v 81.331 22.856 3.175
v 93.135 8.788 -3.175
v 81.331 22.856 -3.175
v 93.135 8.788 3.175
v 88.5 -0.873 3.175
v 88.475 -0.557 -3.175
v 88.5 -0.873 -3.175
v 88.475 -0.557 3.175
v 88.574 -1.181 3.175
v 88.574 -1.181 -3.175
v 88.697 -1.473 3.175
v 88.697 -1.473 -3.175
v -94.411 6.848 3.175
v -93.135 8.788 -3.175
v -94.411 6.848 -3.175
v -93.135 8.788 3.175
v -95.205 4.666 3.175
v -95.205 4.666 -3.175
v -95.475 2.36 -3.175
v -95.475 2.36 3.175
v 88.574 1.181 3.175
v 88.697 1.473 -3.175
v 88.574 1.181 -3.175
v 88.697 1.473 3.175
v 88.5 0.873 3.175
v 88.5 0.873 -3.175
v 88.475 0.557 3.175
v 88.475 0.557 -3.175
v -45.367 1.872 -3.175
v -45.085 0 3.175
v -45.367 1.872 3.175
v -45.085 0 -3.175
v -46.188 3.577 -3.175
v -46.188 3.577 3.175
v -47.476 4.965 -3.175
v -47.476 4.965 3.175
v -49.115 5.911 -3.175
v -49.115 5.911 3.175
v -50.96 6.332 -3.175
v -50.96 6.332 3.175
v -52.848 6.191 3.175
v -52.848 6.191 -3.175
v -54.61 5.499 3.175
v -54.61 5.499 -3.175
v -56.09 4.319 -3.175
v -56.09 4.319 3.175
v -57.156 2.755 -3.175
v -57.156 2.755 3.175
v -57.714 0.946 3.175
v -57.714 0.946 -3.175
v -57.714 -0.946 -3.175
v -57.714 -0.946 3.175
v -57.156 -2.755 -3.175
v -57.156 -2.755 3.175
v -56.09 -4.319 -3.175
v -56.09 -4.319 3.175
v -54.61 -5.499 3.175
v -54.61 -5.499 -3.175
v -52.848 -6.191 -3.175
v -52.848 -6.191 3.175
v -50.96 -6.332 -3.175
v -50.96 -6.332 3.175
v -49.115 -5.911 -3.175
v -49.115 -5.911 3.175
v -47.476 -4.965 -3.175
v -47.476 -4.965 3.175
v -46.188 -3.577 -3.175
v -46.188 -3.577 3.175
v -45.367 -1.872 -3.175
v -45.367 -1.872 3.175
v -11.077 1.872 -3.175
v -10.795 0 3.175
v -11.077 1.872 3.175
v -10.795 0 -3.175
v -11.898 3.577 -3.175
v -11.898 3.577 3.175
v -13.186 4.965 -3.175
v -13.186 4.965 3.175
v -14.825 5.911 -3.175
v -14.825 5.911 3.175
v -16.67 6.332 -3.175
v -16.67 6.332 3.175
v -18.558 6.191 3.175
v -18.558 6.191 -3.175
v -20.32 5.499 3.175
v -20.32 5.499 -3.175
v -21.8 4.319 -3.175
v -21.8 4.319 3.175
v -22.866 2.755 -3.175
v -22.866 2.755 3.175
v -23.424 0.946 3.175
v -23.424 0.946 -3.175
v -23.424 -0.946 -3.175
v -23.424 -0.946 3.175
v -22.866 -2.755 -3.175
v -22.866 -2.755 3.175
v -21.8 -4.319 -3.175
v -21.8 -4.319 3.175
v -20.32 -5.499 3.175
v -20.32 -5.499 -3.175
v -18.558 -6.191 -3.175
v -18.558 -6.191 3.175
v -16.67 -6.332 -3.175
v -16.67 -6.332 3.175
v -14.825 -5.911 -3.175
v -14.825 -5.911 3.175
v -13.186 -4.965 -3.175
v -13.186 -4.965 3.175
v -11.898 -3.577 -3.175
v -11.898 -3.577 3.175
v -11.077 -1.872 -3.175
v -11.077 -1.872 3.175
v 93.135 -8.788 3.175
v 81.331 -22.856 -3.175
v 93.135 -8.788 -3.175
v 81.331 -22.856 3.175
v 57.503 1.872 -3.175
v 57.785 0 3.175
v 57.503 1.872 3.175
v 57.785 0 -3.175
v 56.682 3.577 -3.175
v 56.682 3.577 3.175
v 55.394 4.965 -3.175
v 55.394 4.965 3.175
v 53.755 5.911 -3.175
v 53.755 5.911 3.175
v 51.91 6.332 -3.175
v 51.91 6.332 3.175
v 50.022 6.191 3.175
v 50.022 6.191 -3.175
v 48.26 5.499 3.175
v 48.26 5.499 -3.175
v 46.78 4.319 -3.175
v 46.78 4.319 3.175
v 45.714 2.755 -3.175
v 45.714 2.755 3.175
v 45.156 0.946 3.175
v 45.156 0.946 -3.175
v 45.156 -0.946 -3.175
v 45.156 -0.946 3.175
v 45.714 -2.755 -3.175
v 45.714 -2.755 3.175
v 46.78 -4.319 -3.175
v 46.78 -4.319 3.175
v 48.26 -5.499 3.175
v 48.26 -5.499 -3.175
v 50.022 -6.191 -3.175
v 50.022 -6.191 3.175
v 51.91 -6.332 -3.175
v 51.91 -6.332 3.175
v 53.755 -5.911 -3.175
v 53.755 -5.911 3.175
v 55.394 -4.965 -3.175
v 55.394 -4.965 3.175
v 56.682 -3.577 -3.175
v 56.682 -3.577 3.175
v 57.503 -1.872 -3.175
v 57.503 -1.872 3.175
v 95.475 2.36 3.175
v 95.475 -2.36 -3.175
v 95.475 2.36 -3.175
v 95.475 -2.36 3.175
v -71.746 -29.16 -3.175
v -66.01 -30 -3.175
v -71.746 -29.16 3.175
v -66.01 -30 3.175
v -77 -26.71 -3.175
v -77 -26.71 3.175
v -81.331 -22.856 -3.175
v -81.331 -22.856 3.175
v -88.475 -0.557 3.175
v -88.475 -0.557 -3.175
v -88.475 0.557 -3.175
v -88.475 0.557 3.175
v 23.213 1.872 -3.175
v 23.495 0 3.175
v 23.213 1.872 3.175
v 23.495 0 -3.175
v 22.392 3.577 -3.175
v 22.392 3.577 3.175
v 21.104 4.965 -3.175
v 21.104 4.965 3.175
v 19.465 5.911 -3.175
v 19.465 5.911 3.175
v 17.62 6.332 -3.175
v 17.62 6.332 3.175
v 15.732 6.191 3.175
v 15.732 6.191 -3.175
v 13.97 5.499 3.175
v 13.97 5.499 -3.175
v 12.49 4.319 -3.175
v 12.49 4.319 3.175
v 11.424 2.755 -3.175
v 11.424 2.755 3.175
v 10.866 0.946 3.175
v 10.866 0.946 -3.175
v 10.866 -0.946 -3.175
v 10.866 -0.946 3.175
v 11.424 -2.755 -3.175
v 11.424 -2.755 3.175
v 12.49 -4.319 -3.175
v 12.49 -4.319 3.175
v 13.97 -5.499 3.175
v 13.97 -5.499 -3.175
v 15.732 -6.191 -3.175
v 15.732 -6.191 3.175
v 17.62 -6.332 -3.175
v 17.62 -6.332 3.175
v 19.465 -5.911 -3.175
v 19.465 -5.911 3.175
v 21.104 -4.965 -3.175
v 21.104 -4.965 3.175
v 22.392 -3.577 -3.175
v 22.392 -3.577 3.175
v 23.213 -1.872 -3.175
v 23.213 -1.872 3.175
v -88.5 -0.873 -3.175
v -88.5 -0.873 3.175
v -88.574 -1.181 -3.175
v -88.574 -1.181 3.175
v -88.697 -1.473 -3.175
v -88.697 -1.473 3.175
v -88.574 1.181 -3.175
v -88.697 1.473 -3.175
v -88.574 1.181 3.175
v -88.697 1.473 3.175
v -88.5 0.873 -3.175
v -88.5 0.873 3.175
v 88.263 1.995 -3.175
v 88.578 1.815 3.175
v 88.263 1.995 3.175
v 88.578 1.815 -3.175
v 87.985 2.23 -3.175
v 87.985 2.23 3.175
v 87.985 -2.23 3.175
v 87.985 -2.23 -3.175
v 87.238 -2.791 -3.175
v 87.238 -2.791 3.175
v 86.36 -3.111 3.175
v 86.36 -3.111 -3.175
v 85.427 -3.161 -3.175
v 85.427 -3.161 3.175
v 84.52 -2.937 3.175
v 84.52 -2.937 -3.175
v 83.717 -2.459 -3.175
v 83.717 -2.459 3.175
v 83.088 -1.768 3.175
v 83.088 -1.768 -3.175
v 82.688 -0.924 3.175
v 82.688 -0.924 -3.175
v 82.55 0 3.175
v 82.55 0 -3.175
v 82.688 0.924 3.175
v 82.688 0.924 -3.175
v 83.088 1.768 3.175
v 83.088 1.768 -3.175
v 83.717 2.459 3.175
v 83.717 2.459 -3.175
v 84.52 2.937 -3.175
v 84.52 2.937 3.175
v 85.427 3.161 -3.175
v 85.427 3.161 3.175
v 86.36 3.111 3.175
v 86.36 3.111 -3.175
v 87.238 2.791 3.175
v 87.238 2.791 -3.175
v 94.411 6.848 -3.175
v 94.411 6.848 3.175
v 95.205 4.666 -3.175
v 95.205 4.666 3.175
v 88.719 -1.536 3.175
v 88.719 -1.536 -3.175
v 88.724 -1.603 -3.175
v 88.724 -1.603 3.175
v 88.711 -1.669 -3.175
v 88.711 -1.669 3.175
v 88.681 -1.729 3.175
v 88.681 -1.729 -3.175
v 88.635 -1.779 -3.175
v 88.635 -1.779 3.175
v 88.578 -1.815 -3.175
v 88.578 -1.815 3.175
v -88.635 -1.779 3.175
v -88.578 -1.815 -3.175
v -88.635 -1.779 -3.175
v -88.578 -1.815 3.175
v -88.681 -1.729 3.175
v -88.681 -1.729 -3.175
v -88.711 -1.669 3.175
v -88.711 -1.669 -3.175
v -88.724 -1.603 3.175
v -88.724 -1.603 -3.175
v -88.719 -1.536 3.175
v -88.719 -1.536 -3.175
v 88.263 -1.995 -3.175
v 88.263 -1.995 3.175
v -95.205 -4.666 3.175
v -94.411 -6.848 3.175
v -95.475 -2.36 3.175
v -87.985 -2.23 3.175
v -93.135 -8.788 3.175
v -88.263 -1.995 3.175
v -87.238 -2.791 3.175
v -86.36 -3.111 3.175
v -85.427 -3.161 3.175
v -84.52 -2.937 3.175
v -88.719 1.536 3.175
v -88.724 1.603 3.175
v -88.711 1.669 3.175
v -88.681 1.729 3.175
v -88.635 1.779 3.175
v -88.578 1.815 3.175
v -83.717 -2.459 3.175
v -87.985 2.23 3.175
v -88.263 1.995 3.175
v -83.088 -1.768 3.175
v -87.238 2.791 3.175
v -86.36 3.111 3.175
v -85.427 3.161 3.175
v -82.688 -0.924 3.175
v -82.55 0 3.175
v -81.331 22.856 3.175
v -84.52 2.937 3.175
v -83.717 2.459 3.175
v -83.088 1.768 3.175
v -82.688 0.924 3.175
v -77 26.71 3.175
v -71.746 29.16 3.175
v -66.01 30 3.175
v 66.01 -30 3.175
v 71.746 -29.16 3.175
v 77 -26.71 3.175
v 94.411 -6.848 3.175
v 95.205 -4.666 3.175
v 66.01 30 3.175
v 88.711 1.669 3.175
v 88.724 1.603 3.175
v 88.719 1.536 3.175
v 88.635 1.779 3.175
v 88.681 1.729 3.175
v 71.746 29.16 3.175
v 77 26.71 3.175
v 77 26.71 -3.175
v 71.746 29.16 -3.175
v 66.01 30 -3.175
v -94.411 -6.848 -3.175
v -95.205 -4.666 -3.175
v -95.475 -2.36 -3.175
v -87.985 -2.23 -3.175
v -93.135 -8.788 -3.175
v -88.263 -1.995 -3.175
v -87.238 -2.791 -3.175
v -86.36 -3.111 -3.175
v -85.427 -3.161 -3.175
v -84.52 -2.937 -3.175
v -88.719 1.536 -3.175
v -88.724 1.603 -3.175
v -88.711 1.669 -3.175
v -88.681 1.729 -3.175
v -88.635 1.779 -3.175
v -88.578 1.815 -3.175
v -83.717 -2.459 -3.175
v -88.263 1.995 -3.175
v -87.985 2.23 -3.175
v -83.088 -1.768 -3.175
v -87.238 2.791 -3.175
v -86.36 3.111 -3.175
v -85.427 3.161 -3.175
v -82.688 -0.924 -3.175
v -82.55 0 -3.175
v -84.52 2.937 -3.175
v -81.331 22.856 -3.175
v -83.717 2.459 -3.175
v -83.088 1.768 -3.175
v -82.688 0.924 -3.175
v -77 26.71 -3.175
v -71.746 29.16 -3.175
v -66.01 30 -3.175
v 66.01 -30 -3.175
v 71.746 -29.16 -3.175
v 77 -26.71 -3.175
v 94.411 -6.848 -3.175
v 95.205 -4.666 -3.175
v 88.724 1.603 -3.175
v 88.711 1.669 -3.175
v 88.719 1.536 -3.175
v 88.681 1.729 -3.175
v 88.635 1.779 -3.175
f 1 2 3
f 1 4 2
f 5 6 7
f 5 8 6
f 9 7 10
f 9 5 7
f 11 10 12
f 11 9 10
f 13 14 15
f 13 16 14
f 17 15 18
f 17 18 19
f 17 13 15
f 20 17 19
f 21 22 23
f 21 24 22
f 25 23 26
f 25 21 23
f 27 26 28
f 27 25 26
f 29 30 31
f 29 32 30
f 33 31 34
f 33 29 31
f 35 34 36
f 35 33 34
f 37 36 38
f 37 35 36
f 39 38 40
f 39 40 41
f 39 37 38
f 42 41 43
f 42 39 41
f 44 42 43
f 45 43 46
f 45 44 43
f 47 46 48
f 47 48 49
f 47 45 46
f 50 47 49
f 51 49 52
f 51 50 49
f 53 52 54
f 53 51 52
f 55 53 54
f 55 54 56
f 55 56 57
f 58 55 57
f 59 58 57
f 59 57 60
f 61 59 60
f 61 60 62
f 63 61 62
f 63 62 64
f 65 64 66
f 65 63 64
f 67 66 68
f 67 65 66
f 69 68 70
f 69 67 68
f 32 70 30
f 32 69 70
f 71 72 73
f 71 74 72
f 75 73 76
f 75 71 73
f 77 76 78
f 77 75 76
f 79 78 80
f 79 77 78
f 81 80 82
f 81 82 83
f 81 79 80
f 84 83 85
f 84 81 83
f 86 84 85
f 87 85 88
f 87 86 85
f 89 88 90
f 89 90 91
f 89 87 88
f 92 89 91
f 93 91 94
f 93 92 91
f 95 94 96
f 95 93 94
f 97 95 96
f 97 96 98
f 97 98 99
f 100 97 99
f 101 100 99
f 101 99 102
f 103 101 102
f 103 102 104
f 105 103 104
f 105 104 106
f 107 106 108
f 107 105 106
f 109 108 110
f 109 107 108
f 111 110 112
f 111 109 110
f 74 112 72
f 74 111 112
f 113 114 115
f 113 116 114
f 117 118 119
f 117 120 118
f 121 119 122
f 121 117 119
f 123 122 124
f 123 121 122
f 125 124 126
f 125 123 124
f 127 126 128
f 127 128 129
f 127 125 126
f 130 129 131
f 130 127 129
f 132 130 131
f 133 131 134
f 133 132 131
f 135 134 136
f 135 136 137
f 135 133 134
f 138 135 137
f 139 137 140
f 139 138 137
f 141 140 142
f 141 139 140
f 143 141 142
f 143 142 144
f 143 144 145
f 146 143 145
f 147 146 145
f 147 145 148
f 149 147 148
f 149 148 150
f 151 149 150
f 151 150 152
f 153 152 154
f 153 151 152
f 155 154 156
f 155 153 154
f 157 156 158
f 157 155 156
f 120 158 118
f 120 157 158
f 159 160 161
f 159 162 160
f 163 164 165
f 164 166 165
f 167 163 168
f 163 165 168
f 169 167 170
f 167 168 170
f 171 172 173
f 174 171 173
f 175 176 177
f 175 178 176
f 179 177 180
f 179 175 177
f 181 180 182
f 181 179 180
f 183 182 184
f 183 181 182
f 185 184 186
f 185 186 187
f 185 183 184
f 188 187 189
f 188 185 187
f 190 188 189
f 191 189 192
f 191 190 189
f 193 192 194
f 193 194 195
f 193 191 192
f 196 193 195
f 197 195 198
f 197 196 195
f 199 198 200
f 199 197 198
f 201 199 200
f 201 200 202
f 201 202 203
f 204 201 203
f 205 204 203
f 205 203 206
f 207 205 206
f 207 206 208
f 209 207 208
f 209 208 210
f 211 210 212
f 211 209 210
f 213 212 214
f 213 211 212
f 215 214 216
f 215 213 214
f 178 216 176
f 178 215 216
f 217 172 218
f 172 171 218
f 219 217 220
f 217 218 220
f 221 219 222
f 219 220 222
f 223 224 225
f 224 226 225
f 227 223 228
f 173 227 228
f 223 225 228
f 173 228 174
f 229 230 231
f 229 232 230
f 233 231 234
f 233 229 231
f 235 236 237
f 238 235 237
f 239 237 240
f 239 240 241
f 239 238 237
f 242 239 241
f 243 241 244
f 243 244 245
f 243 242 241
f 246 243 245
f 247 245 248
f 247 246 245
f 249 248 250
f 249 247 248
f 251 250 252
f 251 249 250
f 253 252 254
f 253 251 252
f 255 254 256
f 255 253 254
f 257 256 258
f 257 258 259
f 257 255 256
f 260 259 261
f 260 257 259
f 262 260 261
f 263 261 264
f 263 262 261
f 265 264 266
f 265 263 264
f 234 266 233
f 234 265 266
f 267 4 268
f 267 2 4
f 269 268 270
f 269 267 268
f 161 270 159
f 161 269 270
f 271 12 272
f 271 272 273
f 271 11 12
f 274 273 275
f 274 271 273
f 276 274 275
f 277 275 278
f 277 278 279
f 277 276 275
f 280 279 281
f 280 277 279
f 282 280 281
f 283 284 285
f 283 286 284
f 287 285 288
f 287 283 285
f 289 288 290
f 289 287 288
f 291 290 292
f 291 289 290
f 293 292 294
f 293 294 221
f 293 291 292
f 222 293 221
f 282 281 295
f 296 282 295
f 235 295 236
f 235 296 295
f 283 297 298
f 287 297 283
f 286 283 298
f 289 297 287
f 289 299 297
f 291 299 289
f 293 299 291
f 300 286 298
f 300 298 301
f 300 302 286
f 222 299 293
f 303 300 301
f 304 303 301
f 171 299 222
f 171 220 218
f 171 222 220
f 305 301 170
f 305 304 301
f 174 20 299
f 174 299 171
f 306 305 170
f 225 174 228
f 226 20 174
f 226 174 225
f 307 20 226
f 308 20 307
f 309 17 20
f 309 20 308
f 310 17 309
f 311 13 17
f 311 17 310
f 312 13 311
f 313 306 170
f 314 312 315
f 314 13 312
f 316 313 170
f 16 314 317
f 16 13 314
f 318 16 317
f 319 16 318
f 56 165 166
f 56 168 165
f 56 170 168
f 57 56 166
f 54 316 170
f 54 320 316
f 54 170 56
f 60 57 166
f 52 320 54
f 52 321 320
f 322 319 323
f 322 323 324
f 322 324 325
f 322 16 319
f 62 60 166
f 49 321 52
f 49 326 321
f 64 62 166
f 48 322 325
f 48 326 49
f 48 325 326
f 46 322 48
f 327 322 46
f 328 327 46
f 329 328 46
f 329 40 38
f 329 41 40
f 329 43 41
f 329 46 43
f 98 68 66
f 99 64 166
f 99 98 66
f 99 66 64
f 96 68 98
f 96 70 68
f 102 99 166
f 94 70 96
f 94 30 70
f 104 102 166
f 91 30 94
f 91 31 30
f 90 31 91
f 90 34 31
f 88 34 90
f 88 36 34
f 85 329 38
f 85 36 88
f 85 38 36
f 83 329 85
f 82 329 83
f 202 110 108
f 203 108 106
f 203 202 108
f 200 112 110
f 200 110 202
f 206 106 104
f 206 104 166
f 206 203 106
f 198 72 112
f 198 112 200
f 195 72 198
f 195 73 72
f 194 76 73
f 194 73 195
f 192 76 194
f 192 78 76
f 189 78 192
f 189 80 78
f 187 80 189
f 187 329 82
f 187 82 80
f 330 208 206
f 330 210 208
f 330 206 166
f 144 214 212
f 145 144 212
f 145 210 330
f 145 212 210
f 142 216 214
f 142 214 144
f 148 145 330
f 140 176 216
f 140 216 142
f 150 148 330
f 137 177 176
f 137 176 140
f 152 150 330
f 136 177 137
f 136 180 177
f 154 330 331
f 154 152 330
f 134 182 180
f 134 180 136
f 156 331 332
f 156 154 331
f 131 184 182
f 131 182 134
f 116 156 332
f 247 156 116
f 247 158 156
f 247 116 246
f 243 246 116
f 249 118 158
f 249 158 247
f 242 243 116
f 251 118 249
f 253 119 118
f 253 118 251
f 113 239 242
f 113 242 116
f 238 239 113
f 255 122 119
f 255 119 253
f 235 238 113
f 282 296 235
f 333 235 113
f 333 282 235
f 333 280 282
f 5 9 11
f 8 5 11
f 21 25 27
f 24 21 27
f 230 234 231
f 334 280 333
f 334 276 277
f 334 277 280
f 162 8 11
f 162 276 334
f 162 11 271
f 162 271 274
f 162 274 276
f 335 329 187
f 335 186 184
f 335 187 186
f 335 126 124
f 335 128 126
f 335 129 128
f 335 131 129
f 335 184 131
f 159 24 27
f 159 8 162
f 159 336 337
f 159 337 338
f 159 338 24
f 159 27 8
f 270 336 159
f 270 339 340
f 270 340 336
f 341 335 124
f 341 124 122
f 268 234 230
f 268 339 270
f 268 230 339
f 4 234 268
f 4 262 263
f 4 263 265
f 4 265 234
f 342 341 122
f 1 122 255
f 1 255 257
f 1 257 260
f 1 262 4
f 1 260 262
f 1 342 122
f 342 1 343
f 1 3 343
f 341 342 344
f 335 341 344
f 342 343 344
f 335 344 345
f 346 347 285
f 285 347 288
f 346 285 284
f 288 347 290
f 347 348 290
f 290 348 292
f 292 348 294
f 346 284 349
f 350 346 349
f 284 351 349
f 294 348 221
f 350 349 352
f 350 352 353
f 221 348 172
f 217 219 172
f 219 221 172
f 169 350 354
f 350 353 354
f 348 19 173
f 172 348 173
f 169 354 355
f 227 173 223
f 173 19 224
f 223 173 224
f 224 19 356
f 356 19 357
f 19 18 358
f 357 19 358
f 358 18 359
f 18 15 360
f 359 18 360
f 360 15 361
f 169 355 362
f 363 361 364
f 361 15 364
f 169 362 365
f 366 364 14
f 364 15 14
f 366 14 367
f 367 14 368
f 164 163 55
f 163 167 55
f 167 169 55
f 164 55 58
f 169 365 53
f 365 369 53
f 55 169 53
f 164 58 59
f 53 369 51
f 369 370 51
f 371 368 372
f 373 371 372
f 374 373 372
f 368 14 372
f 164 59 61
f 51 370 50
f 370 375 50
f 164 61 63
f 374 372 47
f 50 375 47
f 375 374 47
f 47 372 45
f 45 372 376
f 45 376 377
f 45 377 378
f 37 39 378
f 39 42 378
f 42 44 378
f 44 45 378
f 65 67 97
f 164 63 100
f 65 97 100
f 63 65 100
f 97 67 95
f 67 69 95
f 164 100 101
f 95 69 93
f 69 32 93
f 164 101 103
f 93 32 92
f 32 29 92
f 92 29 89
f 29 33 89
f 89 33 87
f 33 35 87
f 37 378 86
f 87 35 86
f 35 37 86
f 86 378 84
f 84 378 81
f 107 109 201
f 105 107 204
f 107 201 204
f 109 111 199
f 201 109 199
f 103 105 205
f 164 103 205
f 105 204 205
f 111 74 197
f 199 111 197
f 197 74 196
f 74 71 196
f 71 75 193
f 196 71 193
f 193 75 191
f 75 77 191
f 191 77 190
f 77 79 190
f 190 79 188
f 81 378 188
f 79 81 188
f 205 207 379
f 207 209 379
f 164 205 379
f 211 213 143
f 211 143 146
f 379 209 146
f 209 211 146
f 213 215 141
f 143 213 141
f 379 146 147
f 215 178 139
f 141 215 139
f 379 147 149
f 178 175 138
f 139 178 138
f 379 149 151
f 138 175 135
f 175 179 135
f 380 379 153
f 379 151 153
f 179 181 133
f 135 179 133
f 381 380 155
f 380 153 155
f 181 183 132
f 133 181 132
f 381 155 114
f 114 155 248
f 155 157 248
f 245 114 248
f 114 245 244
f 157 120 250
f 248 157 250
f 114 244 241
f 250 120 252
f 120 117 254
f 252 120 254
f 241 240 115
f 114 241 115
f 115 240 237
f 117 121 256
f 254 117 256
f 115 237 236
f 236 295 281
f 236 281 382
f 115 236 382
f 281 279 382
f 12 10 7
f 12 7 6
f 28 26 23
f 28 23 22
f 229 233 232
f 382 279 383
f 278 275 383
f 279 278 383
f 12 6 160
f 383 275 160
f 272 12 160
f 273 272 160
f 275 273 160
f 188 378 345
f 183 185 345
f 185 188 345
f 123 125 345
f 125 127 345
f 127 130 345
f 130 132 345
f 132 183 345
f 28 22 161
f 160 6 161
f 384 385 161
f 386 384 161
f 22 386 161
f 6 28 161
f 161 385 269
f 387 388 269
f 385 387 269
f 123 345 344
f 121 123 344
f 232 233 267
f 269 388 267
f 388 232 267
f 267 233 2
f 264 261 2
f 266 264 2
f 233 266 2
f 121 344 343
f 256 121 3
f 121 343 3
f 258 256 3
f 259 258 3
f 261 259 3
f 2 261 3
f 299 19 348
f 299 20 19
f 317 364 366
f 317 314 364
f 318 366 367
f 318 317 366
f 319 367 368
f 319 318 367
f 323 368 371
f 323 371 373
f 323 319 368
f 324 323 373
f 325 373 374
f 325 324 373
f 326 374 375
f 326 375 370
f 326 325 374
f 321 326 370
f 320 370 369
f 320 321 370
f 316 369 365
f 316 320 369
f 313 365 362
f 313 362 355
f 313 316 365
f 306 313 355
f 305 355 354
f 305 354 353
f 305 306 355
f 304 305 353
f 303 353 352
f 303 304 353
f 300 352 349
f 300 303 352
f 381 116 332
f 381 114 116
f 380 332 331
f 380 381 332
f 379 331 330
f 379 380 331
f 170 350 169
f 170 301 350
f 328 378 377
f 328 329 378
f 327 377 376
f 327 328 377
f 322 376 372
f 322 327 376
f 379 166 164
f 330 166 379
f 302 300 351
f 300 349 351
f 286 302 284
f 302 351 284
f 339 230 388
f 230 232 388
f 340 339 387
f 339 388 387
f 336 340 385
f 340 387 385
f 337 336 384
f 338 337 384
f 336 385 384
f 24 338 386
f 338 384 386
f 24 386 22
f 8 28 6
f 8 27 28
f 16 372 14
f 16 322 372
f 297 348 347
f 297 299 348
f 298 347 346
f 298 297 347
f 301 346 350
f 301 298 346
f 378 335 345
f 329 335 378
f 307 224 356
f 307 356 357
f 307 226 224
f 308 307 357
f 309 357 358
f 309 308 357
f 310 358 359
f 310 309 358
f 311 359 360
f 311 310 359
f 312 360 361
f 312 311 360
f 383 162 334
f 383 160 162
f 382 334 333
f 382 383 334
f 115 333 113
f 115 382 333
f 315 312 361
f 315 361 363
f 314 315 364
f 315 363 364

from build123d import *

# Parameters (mm, degrees)
SKETCH1_R           = 6.35
BOSS_EXTRUDE1_DEPTH = 3.175
FILLET1_R           = 2
FILLET2_R           = 10
FILLET3_R           = 20


with BuildPart() as part:
    # Sketch1 → Boss-Extrude1 (new, symmetric)
    with BuildSketch(Plane.XY):
        Polygon((75.336239509, 30), (-75.336239509, 30), (-95.474630657, 6), (-95.474630657, -6), (-75.336239509, -30), (75.336239509, -30), (95.474630657, -6), (95.474630657, 6), align=None)
        with BuildLine():
            Line((-88.474630657, -1.3375), (-88.474630657, 1.3375))
            ThreePointArc((-88.474630657, 1.3375), (-88.714791341, 1.656946712), (-88.341203698, 1.798917233))
            ThreePointArc((-88.341203698, 1.798917233), (-82.55, 0), (-88.341203698, -1.798917233))
            ThreePointArc((-88.341203698, -1.798917233), (-88.714791341, -1.656946712), (-88.474630657, -1.3375))
        make_face(mode=Mode.SUBTRACT)
        with Locations((-51.435, 0)):
            Circle(SKETCH1_R, mode=Mode.SUBTRACT)
        with Locations((-17.145, 0)):
            Circle(SKETCH1_R, mode=Mode.SUBTRACT)
        with Locations((17.145, 0)):
            Circle(SKETCH1_R, mode=Mode.SUBTRACT)
        with Locations((51.435, 0)):
            Circle(SKETCH1_R, mode=Mode.SUBTRACT)
        with BuildLine():
            ThreePointArc((88.341203698, 1.798917233), (88.714791341, 1.656946712), (88.474630657, 1.3375))
            Line((88.474630657, 1.3375), (88.474630657, -1.3375))
            ThreePointArc((88.474630657, -1.3375), (88.714791341, -1.656946712), (88.341203698, -1.798917233))
            ThreePointArc((88.341203698, -1.798917233), (82.55, 0), (88.341203698, 1.798917233))
        make_face(mode=Mode.SUBTRACT)
    extrude(amount=BOSS_EXTRUDE1_DEPTH, both=True)

    # Fillet1
    fillet1_edges = [part.edges().sort_by_distance(p)[0] for p in [
        (-88.341203698, 1.798917233, 0),
        (-88.474630657, 1.3375, 0),
        (-88.474630657, -1.3375, 0),
        (-88.341203698, -1.798917233, 0),
        (88.341203698, -1.798917233, 0),
        (88.474630657, -1.3375, 0),
        (88.474630657, 1.3375, 0),
        (88.341203698, 1.798917233, 0),
    ]]
    fillet(fillet1_edges, radius=FILLET1_R)

    # Fillet2
    fillet2_edges = [part.edges().sort_by_distance(p)[0] for p in [
        (95.474630657, 6, 0),
        (95.474630657, -6, 0),
        (-95.474630657, -6, 0),
        (-95.474630657, 6, 0),
    ]]
    fillet(fillet2_edges, radius=FILLET2_R)

    # Fillet3
    fillet3_edges = [part.edges().sort_by_distance(p)[0] for p in [
        (75.336239509, -30, 0),
        (-75.336239509, -30, 0),
        (-75.336239509, 30, 0),
        (75.336239509, 30, 0),
    ]]
    fillet(fillet3_edges, radius=FILLET3_R)


solid = part.part
